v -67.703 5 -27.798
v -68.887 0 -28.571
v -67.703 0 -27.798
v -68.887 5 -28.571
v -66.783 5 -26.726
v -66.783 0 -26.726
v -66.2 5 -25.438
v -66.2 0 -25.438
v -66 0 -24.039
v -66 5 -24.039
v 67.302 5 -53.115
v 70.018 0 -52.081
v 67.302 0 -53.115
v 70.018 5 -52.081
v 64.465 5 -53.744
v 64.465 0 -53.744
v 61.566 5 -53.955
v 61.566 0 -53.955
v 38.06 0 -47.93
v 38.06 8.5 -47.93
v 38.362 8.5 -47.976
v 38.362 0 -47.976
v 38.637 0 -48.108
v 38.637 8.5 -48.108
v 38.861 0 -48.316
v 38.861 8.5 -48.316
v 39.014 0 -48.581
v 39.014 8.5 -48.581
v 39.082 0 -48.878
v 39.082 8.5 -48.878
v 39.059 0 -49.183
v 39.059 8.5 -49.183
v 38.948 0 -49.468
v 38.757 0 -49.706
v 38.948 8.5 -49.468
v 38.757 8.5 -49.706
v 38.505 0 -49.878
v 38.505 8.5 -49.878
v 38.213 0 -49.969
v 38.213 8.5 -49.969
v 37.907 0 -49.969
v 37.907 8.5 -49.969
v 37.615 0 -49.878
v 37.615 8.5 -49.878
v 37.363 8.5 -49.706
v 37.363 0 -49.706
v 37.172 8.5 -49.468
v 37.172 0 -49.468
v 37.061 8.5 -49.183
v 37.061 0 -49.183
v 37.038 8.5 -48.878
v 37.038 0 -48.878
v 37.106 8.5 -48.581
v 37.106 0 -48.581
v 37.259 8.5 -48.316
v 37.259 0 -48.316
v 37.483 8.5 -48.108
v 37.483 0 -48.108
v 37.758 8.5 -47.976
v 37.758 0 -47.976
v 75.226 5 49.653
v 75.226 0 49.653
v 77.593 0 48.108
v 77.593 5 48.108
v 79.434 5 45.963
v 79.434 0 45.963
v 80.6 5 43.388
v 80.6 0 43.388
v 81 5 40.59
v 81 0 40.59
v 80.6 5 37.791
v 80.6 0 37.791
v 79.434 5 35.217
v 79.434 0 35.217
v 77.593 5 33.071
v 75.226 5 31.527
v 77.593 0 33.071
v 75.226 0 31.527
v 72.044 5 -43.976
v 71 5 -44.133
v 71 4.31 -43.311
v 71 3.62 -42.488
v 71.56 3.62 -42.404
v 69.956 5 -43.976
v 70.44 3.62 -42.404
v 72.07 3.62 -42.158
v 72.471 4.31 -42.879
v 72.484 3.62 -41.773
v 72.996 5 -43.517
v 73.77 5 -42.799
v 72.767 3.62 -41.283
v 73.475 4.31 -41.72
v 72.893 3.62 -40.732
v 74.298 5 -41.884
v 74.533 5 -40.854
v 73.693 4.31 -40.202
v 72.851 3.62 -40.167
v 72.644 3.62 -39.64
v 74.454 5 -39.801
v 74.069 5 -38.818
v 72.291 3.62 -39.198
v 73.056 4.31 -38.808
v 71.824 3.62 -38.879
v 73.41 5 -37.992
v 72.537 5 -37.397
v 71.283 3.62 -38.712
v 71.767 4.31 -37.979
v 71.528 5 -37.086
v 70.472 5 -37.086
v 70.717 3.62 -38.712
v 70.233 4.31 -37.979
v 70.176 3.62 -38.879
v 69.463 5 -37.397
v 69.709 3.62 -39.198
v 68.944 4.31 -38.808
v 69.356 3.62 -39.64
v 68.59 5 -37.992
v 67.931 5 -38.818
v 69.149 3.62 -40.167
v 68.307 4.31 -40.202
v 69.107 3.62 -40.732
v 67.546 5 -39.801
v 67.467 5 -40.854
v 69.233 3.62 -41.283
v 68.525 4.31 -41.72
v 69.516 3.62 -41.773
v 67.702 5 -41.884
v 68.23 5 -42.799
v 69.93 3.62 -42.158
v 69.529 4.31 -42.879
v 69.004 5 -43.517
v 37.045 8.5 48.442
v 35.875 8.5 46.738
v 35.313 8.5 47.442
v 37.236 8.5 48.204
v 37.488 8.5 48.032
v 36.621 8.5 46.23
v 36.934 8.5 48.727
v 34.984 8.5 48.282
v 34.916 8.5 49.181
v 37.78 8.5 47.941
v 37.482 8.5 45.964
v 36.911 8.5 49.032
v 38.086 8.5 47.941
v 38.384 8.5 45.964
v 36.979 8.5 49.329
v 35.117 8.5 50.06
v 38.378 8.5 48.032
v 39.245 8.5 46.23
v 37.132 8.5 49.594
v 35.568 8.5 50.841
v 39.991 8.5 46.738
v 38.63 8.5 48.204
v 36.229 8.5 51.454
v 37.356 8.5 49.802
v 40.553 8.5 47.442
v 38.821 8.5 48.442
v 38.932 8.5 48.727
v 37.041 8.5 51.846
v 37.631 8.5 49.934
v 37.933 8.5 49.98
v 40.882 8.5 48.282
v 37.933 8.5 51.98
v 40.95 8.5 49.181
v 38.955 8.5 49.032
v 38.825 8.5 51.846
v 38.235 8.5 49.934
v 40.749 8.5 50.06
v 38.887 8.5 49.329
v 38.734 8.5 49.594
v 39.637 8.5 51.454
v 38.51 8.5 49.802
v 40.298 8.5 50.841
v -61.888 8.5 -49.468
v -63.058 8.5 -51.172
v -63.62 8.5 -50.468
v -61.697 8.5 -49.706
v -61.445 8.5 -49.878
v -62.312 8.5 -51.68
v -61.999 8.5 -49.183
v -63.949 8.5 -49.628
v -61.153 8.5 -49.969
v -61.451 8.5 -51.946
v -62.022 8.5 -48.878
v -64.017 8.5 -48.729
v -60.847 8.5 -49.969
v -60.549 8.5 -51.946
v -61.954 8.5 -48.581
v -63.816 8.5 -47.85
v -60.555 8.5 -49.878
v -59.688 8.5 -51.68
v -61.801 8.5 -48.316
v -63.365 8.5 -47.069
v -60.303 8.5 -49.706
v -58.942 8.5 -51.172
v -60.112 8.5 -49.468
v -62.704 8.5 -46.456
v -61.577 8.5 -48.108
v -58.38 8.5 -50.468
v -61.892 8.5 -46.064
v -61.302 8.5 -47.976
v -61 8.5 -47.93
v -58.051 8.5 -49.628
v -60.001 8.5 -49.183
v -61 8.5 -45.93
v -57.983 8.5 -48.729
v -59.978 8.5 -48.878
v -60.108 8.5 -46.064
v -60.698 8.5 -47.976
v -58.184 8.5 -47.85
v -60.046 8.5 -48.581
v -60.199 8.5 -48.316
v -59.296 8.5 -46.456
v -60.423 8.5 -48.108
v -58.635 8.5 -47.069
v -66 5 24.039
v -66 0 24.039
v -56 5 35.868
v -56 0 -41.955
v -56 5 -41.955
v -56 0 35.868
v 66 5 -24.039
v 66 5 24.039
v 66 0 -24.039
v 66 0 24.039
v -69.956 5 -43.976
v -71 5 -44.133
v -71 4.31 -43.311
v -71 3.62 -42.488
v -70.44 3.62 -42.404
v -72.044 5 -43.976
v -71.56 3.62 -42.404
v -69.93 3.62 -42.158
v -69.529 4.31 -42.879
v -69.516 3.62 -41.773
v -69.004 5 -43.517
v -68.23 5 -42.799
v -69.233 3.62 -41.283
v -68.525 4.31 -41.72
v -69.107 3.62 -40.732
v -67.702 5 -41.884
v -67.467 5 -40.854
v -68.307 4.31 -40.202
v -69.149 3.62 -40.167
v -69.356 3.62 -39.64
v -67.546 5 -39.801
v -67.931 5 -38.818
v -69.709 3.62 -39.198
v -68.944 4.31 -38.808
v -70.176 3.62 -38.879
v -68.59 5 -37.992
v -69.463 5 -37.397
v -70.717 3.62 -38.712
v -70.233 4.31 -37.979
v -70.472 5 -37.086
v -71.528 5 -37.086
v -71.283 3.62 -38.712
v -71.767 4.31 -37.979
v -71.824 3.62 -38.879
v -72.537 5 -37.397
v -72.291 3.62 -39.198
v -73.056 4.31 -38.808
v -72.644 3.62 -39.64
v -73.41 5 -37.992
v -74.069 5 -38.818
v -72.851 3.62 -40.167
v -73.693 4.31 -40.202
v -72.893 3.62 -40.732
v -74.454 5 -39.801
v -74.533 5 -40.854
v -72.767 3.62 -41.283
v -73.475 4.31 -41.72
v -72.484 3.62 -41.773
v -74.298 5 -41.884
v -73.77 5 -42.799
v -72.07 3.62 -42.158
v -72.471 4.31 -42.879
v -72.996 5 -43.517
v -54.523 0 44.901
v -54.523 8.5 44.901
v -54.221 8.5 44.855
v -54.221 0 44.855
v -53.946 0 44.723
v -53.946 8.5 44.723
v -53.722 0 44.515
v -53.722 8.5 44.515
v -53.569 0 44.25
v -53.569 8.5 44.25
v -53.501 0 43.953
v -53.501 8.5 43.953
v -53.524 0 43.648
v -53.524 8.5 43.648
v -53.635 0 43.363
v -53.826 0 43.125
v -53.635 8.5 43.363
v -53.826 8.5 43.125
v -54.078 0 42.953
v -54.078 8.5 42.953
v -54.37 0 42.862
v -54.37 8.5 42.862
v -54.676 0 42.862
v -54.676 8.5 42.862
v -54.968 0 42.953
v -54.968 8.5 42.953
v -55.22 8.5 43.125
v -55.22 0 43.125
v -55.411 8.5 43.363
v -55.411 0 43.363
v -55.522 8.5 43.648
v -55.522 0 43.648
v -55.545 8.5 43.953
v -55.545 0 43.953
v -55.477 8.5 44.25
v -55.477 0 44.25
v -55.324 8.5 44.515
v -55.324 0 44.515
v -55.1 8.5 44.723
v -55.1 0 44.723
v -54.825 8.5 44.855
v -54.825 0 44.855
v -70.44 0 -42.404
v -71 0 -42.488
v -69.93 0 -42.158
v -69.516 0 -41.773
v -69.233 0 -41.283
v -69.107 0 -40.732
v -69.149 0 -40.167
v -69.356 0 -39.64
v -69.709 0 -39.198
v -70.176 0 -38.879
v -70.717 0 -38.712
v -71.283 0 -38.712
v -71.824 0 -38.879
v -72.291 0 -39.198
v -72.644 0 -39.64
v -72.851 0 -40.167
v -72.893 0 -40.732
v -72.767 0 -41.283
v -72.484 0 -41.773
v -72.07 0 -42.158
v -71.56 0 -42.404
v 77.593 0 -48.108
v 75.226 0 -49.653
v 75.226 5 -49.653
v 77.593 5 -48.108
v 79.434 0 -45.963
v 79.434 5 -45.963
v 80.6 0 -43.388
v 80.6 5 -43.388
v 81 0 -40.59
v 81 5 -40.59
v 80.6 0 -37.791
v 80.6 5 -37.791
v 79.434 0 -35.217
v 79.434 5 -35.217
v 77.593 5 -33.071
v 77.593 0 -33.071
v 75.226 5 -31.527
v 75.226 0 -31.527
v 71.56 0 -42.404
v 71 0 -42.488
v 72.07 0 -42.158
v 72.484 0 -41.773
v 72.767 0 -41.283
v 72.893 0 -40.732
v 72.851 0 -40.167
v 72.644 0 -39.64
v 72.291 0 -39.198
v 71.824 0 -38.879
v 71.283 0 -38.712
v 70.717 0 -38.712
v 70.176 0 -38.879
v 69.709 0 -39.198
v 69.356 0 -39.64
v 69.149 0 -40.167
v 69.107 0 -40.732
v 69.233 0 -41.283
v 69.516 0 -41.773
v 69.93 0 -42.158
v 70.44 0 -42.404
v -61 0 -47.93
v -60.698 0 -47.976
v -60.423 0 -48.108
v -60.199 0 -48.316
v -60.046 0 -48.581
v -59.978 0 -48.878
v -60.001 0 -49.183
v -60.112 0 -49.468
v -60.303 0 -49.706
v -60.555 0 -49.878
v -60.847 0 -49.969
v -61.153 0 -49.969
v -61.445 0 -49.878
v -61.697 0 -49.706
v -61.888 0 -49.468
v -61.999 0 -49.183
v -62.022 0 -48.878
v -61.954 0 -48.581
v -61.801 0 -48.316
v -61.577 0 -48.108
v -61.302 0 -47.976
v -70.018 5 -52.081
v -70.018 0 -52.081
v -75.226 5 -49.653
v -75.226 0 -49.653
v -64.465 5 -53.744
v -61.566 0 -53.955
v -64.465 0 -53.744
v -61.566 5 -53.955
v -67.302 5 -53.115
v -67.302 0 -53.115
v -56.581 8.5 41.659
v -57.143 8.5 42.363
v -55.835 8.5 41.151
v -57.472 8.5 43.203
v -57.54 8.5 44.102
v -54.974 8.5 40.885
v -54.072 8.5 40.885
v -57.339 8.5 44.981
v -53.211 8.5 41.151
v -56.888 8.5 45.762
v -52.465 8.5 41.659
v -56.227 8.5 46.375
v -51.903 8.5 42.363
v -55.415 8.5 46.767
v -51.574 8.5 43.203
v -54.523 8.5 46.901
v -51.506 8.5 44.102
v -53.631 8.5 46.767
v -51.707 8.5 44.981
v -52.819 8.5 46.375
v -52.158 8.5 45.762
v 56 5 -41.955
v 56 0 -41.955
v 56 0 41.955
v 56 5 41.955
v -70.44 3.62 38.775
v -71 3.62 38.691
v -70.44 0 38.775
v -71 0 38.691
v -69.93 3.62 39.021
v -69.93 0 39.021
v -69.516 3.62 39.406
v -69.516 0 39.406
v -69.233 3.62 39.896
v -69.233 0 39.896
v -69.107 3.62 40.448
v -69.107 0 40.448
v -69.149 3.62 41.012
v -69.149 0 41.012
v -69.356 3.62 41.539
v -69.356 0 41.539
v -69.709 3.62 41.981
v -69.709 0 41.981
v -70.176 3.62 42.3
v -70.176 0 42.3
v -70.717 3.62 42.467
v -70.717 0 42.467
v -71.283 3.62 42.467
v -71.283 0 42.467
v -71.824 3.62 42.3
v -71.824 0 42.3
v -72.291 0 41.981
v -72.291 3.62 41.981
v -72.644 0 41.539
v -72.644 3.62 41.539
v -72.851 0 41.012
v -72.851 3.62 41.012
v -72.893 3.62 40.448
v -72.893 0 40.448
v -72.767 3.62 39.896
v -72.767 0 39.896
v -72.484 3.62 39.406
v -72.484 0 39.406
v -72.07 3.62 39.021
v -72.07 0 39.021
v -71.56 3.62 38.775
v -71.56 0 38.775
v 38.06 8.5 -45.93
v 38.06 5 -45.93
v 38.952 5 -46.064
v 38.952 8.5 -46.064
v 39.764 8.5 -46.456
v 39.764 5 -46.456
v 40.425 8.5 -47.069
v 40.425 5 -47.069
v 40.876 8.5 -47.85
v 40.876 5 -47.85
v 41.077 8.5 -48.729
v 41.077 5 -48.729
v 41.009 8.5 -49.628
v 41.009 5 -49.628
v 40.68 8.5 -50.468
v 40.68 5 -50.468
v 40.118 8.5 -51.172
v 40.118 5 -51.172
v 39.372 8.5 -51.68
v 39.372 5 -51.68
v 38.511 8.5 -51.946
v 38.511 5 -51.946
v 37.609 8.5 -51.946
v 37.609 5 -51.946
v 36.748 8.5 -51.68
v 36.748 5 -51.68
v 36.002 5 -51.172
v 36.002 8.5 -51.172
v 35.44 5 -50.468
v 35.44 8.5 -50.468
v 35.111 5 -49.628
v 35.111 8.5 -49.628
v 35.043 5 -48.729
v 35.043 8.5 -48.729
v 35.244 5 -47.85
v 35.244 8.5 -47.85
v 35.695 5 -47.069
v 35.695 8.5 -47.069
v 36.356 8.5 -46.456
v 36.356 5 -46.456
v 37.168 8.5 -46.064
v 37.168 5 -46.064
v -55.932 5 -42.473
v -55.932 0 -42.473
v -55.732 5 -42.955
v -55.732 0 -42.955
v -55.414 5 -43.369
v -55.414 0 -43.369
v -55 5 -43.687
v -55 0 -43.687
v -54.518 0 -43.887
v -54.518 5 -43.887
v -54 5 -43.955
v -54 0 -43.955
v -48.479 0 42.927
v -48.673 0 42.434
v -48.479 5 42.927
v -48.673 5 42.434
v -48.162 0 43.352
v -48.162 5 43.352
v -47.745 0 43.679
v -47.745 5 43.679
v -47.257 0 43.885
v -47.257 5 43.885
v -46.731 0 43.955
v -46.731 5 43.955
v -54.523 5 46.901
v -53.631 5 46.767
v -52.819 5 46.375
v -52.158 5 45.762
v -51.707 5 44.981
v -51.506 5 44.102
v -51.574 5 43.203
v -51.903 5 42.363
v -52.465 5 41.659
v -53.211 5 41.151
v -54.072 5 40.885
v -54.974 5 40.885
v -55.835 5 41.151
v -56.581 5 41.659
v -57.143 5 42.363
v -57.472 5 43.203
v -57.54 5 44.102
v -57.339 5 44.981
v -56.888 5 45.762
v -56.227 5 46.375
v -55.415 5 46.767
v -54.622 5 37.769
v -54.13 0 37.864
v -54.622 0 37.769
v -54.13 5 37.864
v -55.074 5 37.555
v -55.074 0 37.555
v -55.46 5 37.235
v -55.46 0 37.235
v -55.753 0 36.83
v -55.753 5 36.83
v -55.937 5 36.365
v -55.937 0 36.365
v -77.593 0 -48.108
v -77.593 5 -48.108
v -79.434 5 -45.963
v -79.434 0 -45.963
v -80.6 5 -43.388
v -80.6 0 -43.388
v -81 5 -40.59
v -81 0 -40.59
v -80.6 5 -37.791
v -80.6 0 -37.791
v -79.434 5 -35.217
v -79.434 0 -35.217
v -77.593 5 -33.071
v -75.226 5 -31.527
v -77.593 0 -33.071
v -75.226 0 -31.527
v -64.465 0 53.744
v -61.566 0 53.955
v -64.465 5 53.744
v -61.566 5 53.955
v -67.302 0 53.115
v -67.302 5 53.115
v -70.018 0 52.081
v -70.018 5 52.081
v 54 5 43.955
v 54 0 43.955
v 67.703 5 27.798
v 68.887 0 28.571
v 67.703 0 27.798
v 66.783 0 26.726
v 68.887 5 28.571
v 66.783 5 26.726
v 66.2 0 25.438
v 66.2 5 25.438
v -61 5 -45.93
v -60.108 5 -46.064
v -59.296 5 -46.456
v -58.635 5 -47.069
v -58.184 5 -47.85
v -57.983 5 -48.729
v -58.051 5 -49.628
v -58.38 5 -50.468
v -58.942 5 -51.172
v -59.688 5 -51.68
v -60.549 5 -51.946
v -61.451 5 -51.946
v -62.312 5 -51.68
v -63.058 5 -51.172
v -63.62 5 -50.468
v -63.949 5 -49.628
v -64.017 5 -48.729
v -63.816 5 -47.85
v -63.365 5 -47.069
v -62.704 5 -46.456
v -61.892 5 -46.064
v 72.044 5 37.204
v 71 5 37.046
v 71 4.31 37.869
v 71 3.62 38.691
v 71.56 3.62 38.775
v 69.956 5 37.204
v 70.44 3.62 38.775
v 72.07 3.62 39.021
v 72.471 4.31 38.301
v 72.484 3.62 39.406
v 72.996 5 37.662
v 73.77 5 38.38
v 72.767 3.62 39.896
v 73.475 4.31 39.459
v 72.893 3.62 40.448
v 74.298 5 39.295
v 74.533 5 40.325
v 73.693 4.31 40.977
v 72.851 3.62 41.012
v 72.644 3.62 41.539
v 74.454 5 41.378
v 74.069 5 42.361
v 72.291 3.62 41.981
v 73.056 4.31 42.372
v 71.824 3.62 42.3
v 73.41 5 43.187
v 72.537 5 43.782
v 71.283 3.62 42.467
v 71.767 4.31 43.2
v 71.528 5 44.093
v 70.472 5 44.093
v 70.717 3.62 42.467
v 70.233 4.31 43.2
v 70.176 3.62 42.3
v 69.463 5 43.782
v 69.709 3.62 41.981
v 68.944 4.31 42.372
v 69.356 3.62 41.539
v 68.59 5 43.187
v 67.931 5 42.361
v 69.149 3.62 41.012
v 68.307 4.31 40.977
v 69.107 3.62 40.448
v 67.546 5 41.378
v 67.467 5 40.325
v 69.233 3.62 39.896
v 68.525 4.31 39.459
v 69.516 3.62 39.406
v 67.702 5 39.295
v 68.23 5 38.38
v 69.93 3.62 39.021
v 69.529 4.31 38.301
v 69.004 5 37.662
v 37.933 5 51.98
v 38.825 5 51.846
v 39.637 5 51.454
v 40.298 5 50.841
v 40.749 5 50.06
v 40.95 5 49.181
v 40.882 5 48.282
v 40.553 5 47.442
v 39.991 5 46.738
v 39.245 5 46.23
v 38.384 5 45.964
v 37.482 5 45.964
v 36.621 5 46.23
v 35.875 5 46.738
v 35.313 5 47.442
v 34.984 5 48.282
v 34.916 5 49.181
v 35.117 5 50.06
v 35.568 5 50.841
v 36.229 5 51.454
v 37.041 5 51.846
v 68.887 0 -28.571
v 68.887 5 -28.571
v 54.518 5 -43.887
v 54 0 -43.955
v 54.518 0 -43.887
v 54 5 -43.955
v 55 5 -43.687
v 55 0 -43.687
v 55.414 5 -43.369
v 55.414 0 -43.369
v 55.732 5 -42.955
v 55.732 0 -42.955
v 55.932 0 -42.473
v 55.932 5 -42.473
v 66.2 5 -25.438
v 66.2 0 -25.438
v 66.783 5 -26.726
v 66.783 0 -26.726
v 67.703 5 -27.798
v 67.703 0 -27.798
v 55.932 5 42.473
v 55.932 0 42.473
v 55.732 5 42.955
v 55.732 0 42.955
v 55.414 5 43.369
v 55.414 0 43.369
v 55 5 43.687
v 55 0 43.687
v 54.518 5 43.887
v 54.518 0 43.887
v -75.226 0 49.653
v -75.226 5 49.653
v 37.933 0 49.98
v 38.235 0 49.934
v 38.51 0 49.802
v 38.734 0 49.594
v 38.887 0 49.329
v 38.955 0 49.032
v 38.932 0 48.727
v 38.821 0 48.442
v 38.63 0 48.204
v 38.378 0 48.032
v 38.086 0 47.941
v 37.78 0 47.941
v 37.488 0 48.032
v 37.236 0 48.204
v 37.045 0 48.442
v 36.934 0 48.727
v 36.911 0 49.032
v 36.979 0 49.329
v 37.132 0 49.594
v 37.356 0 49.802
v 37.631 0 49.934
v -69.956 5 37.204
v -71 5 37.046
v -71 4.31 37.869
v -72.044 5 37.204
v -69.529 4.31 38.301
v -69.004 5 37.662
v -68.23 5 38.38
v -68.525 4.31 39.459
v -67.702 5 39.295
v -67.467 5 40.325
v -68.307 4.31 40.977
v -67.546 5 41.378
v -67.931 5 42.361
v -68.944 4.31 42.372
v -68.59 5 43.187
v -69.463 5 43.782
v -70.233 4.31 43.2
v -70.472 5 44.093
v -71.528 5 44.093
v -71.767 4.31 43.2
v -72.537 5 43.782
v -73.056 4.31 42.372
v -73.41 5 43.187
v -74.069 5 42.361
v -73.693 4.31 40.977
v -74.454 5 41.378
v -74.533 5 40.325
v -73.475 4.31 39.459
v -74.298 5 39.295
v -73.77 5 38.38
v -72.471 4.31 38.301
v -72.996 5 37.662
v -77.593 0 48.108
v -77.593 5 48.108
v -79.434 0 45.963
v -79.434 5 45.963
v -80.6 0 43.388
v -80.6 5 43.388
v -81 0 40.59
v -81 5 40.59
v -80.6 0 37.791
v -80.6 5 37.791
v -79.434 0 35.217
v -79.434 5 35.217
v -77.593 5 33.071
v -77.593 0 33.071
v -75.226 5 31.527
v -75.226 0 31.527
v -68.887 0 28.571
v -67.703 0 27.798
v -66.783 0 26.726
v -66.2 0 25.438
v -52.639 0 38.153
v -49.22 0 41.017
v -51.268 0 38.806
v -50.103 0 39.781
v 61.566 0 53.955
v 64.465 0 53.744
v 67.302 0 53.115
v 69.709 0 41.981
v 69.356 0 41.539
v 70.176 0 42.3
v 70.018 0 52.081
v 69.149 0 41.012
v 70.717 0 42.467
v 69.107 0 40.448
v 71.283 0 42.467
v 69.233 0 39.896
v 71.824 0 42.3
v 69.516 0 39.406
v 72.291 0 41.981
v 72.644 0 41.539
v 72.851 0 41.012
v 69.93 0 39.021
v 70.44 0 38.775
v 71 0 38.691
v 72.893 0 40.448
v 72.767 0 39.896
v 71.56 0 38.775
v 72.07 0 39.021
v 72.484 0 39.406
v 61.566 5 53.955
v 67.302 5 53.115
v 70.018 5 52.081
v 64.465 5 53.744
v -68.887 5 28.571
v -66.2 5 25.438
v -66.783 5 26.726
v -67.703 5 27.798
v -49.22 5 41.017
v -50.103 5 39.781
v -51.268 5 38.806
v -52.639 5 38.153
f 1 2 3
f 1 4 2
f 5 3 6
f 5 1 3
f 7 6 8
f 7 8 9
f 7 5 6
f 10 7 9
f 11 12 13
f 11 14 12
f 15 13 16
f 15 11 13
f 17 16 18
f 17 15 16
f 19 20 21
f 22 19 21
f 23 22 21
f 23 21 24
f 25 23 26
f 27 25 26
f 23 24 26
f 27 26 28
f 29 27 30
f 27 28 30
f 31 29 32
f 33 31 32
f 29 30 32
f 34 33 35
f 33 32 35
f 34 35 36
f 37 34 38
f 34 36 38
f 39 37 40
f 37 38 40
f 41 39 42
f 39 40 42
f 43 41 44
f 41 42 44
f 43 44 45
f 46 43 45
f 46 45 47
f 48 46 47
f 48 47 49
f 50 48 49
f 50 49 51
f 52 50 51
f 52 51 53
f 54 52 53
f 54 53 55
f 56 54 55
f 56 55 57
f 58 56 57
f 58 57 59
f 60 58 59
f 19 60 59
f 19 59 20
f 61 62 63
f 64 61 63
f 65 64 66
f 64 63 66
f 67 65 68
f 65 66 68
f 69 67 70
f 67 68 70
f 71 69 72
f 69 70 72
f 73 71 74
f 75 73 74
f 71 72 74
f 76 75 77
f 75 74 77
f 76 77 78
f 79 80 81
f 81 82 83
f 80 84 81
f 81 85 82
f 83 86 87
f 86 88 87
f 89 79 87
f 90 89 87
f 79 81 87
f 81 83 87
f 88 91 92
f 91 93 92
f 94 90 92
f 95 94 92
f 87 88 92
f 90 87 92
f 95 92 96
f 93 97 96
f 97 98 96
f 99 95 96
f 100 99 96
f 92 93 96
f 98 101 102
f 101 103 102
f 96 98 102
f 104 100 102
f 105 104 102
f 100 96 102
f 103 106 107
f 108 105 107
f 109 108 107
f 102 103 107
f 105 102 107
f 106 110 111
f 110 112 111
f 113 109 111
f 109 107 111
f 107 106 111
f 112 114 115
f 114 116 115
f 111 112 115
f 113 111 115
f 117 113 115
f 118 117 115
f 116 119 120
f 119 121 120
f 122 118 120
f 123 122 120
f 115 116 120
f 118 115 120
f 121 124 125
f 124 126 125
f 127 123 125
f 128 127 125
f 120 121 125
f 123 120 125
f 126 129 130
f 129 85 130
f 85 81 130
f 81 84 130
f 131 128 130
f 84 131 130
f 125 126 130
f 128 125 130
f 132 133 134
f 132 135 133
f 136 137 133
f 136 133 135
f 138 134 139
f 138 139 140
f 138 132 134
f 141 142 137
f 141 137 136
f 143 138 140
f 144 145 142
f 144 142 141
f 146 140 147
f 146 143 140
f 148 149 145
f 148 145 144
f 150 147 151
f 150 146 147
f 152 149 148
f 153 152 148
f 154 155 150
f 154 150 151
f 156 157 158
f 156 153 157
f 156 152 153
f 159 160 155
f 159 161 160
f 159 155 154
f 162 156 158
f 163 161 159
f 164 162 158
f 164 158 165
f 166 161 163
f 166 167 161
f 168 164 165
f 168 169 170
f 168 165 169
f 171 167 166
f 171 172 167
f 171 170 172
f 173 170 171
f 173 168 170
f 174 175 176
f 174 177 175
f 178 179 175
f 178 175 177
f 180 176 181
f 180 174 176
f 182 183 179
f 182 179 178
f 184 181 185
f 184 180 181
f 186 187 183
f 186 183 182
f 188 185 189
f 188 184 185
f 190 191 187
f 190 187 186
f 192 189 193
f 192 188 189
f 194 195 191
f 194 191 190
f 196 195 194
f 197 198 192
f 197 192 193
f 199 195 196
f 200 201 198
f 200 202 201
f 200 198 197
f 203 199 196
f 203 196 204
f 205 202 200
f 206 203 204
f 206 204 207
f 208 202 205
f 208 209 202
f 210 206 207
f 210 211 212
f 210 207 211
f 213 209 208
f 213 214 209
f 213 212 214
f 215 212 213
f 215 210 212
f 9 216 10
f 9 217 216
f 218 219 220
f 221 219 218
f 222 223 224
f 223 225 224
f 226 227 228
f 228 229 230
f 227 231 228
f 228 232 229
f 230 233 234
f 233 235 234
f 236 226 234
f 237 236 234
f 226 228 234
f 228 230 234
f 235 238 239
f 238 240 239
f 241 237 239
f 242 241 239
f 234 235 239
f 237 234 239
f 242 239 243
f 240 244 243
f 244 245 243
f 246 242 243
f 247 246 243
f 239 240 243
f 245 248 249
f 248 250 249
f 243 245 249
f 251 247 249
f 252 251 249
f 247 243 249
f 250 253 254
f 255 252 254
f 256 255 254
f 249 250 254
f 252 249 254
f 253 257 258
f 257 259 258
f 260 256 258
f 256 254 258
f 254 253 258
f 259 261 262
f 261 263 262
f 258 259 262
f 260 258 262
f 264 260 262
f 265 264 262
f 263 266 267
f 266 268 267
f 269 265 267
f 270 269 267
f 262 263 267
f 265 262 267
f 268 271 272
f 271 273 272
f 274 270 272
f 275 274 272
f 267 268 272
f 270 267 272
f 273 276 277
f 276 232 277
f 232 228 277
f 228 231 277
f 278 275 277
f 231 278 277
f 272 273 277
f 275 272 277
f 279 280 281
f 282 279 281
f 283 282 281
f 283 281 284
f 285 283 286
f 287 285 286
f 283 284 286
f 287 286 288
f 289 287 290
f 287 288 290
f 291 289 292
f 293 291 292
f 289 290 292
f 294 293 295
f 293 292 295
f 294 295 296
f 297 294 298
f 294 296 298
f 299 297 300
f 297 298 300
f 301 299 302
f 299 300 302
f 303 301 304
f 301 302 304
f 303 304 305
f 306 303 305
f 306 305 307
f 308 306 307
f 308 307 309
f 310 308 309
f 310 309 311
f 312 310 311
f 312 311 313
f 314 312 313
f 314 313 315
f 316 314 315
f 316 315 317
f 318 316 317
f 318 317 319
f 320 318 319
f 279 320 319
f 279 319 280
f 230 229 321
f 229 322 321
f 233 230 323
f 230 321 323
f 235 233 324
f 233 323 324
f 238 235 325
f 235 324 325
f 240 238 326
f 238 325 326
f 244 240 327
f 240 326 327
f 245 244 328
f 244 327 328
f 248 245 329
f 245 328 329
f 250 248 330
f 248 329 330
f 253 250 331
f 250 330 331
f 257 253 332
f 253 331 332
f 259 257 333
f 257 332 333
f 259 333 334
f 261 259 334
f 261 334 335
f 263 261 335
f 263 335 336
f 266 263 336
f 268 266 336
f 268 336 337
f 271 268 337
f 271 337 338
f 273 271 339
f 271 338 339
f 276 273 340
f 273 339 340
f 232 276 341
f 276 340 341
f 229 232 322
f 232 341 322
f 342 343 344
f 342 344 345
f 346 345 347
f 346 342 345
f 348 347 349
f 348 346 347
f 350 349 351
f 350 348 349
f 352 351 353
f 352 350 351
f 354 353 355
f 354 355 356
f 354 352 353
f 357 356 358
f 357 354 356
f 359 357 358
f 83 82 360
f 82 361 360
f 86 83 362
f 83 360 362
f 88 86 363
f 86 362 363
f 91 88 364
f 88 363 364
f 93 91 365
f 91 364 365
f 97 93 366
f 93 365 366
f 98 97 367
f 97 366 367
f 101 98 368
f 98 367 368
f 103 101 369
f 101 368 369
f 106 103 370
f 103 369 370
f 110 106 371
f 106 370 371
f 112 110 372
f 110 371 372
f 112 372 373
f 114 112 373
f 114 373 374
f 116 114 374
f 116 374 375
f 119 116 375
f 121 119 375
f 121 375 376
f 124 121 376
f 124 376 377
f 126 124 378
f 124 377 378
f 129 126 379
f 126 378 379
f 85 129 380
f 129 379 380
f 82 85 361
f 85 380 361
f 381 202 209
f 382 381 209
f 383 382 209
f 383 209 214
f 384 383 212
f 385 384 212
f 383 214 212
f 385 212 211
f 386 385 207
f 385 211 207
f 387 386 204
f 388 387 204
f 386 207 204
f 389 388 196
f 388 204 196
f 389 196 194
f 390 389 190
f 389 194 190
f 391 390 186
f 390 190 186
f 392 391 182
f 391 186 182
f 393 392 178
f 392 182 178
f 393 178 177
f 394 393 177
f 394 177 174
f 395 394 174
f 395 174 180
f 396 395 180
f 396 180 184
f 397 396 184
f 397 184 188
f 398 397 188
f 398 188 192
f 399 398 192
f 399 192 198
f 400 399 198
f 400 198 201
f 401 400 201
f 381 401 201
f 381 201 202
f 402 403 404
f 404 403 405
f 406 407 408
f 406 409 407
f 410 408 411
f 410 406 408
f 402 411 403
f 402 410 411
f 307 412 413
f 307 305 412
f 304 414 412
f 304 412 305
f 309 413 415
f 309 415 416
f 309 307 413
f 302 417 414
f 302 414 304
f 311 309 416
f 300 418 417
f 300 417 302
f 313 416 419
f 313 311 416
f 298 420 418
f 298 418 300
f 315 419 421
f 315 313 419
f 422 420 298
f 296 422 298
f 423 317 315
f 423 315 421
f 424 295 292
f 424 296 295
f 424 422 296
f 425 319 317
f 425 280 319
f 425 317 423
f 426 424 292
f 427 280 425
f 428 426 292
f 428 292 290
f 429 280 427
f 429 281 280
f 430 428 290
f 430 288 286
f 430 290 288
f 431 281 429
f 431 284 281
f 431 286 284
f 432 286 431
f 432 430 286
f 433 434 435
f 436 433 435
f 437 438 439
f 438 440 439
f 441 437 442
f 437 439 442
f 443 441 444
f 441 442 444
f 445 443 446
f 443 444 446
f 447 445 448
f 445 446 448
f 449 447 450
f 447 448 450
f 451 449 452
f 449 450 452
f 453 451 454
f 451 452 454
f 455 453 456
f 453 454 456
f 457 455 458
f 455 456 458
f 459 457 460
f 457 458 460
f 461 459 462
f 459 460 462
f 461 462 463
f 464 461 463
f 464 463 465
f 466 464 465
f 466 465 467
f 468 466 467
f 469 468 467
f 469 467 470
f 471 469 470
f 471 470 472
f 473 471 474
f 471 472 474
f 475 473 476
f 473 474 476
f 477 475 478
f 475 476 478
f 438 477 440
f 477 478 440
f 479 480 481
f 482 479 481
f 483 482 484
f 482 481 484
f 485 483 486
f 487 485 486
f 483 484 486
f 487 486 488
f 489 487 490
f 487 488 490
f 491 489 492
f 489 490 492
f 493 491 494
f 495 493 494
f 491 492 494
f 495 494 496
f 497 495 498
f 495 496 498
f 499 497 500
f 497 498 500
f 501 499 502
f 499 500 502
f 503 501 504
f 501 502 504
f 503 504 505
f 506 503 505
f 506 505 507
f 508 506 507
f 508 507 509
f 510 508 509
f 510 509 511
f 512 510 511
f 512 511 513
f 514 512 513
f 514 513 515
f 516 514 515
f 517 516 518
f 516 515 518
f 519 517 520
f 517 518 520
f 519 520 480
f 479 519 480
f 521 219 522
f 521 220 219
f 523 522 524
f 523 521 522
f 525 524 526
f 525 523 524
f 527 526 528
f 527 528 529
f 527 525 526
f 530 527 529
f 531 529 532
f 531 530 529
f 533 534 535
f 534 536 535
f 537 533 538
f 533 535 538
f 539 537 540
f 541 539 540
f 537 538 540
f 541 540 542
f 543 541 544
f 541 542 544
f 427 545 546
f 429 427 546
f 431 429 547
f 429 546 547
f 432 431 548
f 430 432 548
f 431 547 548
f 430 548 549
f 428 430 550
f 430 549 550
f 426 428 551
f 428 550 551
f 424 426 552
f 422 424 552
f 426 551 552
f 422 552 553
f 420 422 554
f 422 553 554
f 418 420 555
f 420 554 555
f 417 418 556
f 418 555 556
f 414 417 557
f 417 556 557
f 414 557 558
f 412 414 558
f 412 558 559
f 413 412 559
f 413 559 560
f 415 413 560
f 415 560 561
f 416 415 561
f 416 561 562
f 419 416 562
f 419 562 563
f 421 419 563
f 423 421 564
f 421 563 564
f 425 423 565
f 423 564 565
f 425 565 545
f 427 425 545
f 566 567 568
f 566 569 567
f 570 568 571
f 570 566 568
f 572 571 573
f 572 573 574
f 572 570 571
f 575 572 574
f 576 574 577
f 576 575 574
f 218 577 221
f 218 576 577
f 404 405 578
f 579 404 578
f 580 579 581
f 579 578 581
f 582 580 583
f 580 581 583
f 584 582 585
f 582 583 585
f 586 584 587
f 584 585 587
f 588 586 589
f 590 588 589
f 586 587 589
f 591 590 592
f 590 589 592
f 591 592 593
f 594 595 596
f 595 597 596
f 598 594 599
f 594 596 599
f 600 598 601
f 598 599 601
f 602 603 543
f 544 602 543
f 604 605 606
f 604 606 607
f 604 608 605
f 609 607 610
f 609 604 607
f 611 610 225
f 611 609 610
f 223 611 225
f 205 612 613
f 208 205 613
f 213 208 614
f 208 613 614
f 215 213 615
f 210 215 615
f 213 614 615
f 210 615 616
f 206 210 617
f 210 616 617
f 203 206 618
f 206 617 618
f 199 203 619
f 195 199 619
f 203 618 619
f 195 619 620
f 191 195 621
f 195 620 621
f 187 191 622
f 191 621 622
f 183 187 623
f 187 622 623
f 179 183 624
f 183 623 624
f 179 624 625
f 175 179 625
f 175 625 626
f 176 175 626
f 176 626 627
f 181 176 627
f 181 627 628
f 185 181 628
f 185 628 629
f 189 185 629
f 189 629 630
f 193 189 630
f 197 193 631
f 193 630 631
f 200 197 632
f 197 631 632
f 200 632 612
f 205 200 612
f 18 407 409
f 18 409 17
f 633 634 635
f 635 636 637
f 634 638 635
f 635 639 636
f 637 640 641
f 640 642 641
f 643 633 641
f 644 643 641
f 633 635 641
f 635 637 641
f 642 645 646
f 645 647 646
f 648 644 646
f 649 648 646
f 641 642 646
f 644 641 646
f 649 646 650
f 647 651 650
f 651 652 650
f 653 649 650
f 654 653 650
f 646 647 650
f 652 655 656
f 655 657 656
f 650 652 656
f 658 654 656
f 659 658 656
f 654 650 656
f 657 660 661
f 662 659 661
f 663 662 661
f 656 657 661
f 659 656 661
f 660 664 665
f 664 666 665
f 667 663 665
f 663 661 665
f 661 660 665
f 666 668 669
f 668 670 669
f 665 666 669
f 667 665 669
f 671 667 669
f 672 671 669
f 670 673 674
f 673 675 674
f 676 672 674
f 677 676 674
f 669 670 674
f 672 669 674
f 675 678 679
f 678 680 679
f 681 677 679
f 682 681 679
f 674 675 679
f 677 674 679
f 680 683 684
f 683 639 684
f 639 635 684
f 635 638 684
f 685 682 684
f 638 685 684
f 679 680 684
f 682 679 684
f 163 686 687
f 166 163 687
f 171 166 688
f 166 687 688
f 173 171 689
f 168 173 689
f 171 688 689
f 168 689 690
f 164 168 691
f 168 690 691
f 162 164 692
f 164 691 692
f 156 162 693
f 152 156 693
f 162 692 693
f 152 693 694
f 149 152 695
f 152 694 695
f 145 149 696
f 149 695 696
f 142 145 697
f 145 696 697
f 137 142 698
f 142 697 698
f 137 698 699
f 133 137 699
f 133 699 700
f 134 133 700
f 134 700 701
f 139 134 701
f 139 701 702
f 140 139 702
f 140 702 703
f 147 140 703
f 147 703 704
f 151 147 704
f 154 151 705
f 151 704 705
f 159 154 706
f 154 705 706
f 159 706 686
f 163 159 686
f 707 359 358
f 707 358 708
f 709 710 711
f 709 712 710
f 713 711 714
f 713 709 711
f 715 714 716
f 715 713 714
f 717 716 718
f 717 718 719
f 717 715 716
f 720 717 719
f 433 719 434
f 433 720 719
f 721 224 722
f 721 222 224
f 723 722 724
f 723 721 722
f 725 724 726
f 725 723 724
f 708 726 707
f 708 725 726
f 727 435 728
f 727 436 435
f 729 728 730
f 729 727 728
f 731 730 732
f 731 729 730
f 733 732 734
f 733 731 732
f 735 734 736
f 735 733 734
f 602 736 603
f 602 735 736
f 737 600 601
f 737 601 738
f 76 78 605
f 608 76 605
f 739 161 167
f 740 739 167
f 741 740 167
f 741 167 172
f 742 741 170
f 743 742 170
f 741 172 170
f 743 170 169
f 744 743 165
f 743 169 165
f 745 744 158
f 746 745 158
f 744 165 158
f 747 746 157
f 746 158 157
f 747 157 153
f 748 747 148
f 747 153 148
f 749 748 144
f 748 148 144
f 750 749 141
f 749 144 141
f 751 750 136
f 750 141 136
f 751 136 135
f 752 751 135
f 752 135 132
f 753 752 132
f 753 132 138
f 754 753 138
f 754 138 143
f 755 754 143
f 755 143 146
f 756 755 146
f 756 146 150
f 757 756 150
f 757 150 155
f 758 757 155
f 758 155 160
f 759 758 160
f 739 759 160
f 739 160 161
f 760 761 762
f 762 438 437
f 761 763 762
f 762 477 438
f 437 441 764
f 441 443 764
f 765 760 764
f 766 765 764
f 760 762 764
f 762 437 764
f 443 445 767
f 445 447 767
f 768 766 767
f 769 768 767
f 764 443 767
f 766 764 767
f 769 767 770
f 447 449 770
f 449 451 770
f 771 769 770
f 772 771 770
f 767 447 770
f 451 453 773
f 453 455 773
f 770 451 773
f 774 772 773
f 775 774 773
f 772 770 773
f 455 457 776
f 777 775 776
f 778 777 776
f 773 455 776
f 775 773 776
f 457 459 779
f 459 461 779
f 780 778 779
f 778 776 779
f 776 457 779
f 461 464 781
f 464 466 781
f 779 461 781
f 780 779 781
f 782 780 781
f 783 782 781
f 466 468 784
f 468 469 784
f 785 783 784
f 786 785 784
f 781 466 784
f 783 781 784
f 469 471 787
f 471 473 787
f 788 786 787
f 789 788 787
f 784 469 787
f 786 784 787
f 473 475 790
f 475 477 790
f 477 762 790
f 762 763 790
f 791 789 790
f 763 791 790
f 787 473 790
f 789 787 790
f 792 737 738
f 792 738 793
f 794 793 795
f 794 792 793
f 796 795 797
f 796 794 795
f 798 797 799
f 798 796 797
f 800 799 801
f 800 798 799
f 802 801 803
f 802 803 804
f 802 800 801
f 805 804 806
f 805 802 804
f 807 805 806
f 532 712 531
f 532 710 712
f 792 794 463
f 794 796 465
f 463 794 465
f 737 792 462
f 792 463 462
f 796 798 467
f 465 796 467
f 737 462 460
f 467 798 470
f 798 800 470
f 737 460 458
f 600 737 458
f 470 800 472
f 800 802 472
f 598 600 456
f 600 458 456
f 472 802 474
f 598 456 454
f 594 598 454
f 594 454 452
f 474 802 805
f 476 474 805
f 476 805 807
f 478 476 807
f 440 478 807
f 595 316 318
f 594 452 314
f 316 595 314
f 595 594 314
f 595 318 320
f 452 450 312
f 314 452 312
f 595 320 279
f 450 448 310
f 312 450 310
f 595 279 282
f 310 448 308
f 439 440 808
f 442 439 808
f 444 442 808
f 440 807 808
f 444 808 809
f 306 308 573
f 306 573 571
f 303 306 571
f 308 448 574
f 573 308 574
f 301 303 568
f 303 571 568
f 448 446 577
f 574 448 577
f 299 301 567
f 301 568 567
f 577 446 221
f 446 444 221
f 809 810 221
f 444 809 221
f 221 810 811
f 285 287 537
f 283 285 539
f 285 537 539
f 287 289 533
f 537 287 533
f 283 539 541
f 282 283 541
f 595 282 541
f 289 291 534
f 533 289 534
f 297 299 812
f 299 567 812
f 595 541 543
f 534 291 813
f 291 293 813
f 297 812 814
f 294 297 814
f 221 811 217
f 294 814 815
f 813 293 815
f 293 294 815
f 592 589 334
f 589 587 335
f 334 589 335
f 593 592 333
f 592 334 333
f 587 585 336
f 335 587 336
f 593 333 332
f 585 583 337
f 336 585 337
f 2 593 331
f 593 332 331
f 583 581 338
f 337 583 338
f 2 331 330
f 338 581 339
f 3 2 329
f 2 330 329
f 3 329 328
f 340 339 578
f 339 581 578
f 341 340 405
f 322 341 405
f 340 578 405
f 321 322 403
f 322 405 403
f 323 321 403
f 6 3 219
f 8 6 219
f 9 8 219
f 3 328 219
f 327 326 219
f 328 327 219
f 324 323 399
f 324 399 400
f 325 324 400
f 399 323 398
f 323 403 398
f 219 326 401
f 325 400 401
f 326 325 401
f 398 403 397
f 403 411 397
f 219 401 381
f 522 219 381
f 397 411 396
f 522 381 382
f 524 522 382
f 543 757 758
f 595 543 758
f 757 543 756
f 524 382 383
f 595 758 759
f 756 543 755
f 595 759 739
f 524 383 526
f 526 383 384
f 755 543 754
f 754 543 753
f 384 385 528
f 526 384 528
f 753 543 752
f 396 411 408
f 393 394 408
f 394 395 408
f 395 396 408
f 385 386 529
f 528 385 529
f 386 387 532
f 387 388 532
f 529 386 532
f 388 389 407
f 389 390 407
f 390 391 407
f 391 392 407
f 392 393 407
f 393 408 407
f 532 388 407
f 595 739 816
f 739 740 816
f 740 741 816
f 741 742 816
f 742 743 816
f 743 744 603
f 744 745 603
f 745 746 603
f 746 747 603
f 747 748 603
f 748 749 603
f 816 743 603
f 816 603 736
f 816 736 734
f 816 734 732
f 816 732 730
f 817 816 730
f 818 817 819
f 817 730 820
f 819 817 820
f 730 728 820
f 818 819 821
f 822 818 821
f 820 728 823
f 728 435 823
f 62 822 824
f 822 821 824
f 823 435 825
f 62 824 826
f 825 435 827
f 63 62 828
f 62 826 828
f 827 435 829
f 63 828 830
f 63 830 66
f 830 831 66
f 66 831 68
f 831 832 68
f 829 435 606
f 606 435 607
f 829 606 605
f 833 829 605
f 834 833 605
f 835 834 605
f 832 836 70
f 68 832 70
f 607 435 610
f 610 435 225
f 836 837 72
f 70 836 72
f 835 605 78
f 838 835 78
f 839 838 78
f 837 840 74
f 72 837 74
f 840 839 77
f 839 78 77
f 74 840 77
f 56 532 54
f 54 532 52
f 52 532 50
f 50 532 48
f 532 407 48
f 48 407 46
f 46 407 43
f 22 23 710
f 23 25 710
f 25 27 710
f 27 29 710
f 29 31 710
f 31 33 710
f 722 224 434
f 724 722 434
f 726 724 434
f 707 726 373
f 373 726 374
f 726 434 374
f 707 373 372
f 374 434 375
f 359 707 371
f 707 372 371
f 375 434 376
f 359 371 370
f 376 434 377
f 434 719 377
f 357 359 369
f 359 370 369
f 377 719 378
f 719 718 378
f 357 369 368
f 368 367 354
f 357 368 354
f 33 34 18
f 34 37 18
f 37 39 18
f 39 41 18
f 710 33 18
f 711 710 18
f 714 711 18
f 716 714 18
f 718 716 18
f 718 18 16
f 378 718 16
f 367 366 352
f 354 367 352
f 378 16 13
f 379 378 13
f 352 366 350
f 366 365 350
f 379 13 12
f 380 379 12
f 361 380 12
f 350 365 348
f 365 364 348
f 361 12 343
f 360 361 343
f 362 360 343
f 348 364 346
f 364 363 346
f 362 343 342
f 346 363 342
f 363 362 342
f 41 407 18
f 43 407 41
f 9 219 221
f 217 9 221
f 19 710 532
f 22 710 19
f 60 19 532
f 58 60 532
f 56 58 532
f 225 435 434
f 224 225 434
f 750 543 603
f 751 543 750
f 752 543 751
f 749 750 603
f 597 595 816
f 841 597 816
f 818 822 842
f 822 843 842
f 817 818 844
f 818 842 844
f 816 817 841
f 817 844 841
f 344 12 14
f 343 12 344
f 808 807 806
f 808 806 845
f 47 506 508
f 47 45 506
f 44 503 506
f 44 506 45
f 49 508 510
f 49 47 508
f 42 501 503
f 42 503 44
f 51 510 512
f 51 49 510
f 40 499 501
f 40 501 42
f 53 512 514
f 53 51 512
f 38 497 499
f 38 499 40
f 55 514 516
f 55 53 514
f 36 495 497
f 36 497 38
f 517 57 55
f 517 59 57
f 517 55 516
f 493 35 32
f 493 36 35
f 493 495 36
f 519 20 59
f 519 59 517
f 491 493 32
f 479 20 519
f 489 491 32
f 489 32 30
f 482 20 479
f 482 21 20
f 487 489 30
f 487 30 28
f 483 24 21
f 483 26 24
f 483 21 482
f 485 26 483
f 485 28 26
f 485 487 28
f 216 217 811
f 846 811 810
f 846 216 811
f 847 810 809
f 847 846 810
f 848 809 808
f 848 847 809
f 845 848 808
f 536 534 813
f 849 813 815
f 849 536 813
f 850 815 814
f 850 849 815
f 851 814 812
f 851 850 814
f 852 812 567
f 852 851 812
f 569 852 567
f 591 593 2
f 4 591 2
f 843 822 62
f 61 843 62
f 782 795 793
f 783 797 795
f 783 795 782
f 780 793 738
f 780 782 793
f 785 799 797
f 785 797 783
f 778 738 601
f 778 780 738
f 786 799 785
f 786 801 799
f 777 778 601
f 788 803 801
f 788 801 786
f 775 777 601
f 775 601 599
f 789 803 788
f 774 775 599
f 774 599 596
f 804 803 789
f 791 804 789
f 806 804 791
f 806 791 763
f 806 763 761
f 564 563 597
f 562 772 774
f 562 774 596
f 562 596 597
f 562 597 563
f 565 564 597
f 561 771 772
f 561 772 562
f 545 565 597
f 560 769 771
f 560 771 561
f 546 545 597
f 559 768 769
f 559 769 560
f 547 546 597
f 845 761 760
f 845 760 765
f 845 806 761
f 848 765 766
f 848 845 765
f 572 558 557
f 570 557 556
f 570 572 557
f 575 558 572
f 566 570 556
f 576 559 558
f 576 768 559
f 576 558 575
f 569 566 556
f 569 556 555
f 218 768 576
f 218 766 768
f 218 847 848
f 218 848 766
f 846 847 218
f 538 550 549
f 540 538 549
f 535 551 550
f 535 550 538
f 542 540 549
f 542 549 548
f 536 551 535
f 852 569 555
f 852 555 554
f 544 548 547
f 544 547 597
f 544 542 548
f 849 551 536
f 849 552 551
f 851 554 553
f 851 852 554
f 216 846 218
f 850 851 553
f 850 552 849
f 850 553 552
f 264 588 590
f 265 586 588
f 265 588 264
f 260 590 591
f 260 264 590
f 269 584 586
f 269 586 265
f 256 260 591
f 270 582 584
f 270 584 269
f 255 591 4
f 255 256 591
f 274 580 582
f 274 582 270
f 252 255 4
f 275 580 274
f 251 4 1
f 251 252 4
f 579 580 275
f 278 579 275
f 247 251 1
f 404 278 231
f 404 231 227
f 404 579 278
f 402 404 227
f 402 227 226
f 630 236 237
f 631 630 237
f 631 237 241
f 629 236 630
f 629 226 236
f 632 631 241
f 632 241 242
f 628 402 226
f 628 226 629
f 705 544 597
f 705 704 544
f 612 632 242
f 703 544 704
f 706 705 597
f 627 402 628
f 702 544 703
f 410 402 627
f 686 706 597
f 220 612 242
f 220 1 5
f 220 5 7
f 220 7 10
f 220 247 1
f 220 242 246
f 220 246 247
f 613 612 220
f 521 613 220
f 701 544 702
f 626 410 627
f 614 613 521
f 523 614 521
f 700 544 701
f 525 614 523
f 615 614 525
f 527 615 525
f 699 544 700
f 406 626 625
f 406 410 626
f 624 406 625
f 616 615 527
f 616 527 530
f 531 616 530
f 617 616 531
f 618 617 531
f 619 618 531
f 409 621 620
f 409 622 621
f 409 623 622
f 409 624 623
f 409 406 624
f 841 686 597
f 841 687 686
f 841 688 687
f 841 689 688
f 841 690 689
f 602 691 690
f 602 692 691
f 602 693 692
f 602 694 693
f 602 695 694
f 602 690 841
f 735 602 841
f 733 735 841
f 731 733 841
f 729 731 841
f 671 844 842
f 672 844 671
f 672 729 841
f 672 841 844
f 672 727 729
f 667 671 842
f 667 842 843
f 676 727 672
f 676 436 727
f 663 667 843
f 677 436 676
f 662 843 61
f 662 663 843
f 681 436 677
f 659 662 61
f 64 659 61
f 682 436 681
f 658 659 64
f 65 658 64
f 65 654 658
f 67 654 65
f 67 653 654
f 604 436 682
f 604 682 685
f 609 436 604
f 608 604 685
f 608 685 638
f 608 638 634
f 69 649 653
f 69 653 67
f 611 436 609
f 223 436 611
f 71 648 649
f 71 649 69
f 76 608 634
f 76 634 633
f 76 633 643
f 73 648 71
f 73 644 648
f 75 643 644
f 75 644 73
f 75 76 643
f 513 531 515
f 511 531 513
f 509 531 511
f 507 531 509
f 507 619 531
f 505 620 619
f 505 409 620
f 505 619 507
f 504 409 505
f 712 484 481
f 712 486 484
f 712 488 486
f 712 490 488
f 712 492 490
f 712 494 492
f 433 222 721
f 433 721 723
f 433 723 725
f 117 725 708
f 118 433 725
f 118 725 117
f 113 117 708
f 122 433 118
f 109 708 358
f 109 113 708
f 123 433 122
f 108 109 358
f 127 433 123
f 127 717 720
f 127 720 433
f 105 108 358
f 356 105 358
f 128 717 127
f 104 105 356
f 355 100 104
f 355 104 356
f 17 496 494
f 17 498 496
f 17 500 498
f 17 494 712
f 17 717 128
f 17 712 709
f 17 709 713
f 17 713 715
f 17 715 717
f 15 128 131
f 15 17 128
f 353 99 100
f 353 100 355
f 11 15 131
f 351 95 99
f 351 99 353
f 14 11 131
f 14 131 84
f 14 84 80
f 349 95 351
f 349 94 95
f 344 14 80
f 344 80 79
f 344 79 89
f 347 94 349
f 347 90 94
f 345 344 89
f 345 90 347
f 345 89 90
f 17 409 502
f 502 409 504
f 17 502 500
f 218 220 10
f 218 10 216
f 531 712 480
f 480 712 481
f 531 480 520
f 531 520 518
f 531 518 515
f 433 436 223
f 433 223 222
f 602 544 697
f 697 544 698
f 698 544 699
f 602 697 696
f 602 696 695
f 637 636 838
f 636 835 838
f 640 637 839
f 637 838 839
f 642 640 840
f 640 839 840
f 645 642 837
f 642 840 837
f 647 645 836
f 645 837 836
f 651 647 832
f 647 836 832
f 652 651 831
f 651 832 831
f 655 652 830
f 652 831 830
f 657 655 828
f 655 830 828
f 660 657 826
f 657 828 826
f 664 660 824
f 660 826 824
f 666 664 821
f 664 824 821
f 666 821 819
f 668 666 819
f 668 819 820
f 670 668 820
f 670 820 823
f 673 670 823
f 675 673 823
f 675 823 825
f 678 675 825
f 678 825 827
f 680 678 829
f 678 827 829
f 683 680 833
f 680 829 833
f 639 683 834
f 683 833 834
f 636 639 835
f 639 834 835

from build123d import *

# Parameters (mm, degrees)
QUARTER_BASE_DEPTH                 = 5
CORNER_SCREW_EXPANSION_SKETCH_R    = 6.025
CORNER_SCREW_EXPANSION_DEPTH       = 5
STANDOFFS_EXTRUSION_SKETCH_R       = 3.025
STANDOFFS_EXTRUSION_DEPTH          = 3.5
SMOOTHIEBOARD_SCREW_HOLES_SKETCH_R = 1.025
SMOOTHIEBOARD_SCREW_HOLES_DEPTH    = 98.695404319
NO_6_MOUNTING_SCREWS_D             = 3.7973
NO_6_MOUNTING_SCREWS_CSINK_D       = 7.0866
NO_6_MOUNTING_SCREWS_CSINK_ANGLE   = 100
INSIDE_CORNER_FILLETS_R            = 2
OUTSIDE_CORNER_FILLETS_1_R         = 5
OUTSIDE_CORNER_FILLETS_2_R         = 20


with BuildPart() as part:
    # Quarter Base Sketch → Quarter Base (new body)
    with BuildSketch(Plane(origin=(0, 0, 0), x_dir=(1, 0, 0), z_dir=(0, 1, 0))):
        with BuildLine():
            Line((0, 53.955), (-66, 53.955))
            Line((-66, 53.955), (-75.226182617, 49.65276039))
            ThreePointArc((-75.226182617, 49.65276039), (-81, 40.58968252), (-75.226182617, 31.526604649))
            Line((-75.226182617, 31.526604649), (-66, 27.224365039))
            Line((-66, 27.224365039), (-66, 0))
            Line((-66, 0), (-56, 0))
            Line((-56, 0), (-56, 43.955))
            Line((-56, 43.955), (0, 43.955))
            Line((0, 43.955), (0, 53.955))
        make_face()
    extrude(amount=QUARTER_BASE_DEPTH)

    # Base Mirror 1: part across plane


with BuildPart() as part_1:
    add(part.part)
    add(part.part.mirror(Plane(origin=(-66, 5, 0), x_dir=(1, 0, 0), z_dir=(0, 0, -1))))

    # Base Mirror 2: part across plane


with BuildPart() as part_2:
    add(part_1.part)
    add(part_1.part.mirror(Plane(origin=(0, 5, -43.955), x_dir=(0, 0, 1), z_dir=(-1, 0, 0))))

    # Corner Screw Expansion Sketch → Corner Screw Expansion (add)
    with BuildSketch(Plane(origin=(0, 5, 0), x_dir=(1, 0, 0), z_dir=(0, 1, 0))):
        with Locations((-54.523, -43.876)):
            Circle(CORNER_SCREW_EXPANSION_SKETCH_R)
    extrude(amount=-CORNER_SCREW_EXPANSION_DEPTH)

    # Standoffs Extrusion Sketch → Standoffs Extrusion (add)
    with BuildSketch(Plane(origin=(0, 5, 0), x_dir=(1, 0, 0), z_dir=(0, 1, 0))):
        with Locations(Location((-61, 48.955, 0), (0, 0, 270))):
            Circle(STANDOFFS_EXTRUSION_SKETCH_R)
        with Locations(Location((-54.523, -43.876, 0), (0, 0, 270))):
            Circle(STANDOFFS_EXTRUSION_SKETCH_R)
        with Locations(Location((37.933, -48.955, 0), (0, 0, 270))):
            Circle(STANDOFFS_EXTRUSION_SKETCH_R)
        with Locations(Location((38.06, 48.955, 0), (0, 0, 270))):
            Circle(STANDOFFS_EXTRUSION_SKETCH_R)
    extrude(amount=STANDOFFS_EXTRUSION_DEPTH)

    # Smoothieboard Screw Holes Sketch → Smoothieboard Screw Holes (cut, through all)
    with BuildSketch(Plane(origin=(0, 8.5, 0), x_dir=(1, 0, 0), z_dir=(0, 1, 0))):
        with Locations(Location((-54.523, -43.876, 0), (0, 0, 270))):
            Circle(SMOOTHIEBOARD_SCREW_HOLES_SKETCH_R)
        with Locations(Location((37.933, -48.955, 0), (0, 0, 270))):
            Circle(SMOOTHIEBOARD_SCREW_HOLES_SKETCH_R)
        with Locations(Location((38.06, 48.955, 0), (0, 0, 270))):
            Circle(SMOOTHIEBOARD_SCREW_HOLES_SKETCH_R)
        with Locations(Location((-61, 48.955, 0), (0, 0, 270))):
            Circle(SMOOTHIEBOARD_SCREW_HOLES_SKETCH_R)
    extrude(amount=-SMOOTHIEBOARD_SCREW_HOLES_DEPTH, mode=Mode.SUBTRACT)

    # No. 6 Mounting Screws (through all)
    with Locations(Plane(origin=(-71, 5, -40.58968252), x_dir=(0, 0, 1), z_dir=(0, 1, 0))):
        with Locations((0, 0), (81.17936504, 0), (81.17936504, 142), (0, 142)):
            CounterSinkHole(NO_6_MOUNTING_SCREWS_D / 2, NO_6_MOUNTING_SCREWS_CSINK_D / 2, counter_sink_angle=NO_6_MOUNTING_SCREWS_CSINK_ANGLE)

    # Inside Corner Fillets
    inside_corner_fillets_edges = [part_2.edges().sort_by_distance(p)[0] for p in [
        (-56, 2.5, -43.955),
        (56, 2.5, -43.955),
        (56, 2.5, 43.955),
        (-48.498517948, 2.5, 43.955),
        (-56, 2.5, 38.034844635),
    ]]
    fillet(inside_corner_fillets_edges, radius=INSIDE_CORNER_FILLETS_R)

    # Outside Corner Fillets 1
    outside_corner_fillets_1_edges = [part_2.edges().sort_by_distance(p)[0] for p in [
        (-66, 2.5, -27.224365039),
        (-66, 2.5, 27.224365039),
        (66, 2.5, -27.224365039),
        (66, 2.5, 27.224365039),
    ]]
    fillet(outside_corner_fillets_1_edges, radius=OUTSIDE_CORNER_FILLETS_1_R)

    # Outside Corner Fillets 2
    outside_corner_fillets_2_edges = [part_2.edges().sort_by_distance(p)[0] for p in [
        (-66, 2.5, -53.955),
        (-66, 2.5, 53.955),
        (66, 2.5, -53.955),
        (66, 2.5, 53.955),
    ]]
    fillet(outside_corner_fillets_2_edges, radius=OUTSIDE_CORNER_FILLETS_2_R)


solid = part_2.part
